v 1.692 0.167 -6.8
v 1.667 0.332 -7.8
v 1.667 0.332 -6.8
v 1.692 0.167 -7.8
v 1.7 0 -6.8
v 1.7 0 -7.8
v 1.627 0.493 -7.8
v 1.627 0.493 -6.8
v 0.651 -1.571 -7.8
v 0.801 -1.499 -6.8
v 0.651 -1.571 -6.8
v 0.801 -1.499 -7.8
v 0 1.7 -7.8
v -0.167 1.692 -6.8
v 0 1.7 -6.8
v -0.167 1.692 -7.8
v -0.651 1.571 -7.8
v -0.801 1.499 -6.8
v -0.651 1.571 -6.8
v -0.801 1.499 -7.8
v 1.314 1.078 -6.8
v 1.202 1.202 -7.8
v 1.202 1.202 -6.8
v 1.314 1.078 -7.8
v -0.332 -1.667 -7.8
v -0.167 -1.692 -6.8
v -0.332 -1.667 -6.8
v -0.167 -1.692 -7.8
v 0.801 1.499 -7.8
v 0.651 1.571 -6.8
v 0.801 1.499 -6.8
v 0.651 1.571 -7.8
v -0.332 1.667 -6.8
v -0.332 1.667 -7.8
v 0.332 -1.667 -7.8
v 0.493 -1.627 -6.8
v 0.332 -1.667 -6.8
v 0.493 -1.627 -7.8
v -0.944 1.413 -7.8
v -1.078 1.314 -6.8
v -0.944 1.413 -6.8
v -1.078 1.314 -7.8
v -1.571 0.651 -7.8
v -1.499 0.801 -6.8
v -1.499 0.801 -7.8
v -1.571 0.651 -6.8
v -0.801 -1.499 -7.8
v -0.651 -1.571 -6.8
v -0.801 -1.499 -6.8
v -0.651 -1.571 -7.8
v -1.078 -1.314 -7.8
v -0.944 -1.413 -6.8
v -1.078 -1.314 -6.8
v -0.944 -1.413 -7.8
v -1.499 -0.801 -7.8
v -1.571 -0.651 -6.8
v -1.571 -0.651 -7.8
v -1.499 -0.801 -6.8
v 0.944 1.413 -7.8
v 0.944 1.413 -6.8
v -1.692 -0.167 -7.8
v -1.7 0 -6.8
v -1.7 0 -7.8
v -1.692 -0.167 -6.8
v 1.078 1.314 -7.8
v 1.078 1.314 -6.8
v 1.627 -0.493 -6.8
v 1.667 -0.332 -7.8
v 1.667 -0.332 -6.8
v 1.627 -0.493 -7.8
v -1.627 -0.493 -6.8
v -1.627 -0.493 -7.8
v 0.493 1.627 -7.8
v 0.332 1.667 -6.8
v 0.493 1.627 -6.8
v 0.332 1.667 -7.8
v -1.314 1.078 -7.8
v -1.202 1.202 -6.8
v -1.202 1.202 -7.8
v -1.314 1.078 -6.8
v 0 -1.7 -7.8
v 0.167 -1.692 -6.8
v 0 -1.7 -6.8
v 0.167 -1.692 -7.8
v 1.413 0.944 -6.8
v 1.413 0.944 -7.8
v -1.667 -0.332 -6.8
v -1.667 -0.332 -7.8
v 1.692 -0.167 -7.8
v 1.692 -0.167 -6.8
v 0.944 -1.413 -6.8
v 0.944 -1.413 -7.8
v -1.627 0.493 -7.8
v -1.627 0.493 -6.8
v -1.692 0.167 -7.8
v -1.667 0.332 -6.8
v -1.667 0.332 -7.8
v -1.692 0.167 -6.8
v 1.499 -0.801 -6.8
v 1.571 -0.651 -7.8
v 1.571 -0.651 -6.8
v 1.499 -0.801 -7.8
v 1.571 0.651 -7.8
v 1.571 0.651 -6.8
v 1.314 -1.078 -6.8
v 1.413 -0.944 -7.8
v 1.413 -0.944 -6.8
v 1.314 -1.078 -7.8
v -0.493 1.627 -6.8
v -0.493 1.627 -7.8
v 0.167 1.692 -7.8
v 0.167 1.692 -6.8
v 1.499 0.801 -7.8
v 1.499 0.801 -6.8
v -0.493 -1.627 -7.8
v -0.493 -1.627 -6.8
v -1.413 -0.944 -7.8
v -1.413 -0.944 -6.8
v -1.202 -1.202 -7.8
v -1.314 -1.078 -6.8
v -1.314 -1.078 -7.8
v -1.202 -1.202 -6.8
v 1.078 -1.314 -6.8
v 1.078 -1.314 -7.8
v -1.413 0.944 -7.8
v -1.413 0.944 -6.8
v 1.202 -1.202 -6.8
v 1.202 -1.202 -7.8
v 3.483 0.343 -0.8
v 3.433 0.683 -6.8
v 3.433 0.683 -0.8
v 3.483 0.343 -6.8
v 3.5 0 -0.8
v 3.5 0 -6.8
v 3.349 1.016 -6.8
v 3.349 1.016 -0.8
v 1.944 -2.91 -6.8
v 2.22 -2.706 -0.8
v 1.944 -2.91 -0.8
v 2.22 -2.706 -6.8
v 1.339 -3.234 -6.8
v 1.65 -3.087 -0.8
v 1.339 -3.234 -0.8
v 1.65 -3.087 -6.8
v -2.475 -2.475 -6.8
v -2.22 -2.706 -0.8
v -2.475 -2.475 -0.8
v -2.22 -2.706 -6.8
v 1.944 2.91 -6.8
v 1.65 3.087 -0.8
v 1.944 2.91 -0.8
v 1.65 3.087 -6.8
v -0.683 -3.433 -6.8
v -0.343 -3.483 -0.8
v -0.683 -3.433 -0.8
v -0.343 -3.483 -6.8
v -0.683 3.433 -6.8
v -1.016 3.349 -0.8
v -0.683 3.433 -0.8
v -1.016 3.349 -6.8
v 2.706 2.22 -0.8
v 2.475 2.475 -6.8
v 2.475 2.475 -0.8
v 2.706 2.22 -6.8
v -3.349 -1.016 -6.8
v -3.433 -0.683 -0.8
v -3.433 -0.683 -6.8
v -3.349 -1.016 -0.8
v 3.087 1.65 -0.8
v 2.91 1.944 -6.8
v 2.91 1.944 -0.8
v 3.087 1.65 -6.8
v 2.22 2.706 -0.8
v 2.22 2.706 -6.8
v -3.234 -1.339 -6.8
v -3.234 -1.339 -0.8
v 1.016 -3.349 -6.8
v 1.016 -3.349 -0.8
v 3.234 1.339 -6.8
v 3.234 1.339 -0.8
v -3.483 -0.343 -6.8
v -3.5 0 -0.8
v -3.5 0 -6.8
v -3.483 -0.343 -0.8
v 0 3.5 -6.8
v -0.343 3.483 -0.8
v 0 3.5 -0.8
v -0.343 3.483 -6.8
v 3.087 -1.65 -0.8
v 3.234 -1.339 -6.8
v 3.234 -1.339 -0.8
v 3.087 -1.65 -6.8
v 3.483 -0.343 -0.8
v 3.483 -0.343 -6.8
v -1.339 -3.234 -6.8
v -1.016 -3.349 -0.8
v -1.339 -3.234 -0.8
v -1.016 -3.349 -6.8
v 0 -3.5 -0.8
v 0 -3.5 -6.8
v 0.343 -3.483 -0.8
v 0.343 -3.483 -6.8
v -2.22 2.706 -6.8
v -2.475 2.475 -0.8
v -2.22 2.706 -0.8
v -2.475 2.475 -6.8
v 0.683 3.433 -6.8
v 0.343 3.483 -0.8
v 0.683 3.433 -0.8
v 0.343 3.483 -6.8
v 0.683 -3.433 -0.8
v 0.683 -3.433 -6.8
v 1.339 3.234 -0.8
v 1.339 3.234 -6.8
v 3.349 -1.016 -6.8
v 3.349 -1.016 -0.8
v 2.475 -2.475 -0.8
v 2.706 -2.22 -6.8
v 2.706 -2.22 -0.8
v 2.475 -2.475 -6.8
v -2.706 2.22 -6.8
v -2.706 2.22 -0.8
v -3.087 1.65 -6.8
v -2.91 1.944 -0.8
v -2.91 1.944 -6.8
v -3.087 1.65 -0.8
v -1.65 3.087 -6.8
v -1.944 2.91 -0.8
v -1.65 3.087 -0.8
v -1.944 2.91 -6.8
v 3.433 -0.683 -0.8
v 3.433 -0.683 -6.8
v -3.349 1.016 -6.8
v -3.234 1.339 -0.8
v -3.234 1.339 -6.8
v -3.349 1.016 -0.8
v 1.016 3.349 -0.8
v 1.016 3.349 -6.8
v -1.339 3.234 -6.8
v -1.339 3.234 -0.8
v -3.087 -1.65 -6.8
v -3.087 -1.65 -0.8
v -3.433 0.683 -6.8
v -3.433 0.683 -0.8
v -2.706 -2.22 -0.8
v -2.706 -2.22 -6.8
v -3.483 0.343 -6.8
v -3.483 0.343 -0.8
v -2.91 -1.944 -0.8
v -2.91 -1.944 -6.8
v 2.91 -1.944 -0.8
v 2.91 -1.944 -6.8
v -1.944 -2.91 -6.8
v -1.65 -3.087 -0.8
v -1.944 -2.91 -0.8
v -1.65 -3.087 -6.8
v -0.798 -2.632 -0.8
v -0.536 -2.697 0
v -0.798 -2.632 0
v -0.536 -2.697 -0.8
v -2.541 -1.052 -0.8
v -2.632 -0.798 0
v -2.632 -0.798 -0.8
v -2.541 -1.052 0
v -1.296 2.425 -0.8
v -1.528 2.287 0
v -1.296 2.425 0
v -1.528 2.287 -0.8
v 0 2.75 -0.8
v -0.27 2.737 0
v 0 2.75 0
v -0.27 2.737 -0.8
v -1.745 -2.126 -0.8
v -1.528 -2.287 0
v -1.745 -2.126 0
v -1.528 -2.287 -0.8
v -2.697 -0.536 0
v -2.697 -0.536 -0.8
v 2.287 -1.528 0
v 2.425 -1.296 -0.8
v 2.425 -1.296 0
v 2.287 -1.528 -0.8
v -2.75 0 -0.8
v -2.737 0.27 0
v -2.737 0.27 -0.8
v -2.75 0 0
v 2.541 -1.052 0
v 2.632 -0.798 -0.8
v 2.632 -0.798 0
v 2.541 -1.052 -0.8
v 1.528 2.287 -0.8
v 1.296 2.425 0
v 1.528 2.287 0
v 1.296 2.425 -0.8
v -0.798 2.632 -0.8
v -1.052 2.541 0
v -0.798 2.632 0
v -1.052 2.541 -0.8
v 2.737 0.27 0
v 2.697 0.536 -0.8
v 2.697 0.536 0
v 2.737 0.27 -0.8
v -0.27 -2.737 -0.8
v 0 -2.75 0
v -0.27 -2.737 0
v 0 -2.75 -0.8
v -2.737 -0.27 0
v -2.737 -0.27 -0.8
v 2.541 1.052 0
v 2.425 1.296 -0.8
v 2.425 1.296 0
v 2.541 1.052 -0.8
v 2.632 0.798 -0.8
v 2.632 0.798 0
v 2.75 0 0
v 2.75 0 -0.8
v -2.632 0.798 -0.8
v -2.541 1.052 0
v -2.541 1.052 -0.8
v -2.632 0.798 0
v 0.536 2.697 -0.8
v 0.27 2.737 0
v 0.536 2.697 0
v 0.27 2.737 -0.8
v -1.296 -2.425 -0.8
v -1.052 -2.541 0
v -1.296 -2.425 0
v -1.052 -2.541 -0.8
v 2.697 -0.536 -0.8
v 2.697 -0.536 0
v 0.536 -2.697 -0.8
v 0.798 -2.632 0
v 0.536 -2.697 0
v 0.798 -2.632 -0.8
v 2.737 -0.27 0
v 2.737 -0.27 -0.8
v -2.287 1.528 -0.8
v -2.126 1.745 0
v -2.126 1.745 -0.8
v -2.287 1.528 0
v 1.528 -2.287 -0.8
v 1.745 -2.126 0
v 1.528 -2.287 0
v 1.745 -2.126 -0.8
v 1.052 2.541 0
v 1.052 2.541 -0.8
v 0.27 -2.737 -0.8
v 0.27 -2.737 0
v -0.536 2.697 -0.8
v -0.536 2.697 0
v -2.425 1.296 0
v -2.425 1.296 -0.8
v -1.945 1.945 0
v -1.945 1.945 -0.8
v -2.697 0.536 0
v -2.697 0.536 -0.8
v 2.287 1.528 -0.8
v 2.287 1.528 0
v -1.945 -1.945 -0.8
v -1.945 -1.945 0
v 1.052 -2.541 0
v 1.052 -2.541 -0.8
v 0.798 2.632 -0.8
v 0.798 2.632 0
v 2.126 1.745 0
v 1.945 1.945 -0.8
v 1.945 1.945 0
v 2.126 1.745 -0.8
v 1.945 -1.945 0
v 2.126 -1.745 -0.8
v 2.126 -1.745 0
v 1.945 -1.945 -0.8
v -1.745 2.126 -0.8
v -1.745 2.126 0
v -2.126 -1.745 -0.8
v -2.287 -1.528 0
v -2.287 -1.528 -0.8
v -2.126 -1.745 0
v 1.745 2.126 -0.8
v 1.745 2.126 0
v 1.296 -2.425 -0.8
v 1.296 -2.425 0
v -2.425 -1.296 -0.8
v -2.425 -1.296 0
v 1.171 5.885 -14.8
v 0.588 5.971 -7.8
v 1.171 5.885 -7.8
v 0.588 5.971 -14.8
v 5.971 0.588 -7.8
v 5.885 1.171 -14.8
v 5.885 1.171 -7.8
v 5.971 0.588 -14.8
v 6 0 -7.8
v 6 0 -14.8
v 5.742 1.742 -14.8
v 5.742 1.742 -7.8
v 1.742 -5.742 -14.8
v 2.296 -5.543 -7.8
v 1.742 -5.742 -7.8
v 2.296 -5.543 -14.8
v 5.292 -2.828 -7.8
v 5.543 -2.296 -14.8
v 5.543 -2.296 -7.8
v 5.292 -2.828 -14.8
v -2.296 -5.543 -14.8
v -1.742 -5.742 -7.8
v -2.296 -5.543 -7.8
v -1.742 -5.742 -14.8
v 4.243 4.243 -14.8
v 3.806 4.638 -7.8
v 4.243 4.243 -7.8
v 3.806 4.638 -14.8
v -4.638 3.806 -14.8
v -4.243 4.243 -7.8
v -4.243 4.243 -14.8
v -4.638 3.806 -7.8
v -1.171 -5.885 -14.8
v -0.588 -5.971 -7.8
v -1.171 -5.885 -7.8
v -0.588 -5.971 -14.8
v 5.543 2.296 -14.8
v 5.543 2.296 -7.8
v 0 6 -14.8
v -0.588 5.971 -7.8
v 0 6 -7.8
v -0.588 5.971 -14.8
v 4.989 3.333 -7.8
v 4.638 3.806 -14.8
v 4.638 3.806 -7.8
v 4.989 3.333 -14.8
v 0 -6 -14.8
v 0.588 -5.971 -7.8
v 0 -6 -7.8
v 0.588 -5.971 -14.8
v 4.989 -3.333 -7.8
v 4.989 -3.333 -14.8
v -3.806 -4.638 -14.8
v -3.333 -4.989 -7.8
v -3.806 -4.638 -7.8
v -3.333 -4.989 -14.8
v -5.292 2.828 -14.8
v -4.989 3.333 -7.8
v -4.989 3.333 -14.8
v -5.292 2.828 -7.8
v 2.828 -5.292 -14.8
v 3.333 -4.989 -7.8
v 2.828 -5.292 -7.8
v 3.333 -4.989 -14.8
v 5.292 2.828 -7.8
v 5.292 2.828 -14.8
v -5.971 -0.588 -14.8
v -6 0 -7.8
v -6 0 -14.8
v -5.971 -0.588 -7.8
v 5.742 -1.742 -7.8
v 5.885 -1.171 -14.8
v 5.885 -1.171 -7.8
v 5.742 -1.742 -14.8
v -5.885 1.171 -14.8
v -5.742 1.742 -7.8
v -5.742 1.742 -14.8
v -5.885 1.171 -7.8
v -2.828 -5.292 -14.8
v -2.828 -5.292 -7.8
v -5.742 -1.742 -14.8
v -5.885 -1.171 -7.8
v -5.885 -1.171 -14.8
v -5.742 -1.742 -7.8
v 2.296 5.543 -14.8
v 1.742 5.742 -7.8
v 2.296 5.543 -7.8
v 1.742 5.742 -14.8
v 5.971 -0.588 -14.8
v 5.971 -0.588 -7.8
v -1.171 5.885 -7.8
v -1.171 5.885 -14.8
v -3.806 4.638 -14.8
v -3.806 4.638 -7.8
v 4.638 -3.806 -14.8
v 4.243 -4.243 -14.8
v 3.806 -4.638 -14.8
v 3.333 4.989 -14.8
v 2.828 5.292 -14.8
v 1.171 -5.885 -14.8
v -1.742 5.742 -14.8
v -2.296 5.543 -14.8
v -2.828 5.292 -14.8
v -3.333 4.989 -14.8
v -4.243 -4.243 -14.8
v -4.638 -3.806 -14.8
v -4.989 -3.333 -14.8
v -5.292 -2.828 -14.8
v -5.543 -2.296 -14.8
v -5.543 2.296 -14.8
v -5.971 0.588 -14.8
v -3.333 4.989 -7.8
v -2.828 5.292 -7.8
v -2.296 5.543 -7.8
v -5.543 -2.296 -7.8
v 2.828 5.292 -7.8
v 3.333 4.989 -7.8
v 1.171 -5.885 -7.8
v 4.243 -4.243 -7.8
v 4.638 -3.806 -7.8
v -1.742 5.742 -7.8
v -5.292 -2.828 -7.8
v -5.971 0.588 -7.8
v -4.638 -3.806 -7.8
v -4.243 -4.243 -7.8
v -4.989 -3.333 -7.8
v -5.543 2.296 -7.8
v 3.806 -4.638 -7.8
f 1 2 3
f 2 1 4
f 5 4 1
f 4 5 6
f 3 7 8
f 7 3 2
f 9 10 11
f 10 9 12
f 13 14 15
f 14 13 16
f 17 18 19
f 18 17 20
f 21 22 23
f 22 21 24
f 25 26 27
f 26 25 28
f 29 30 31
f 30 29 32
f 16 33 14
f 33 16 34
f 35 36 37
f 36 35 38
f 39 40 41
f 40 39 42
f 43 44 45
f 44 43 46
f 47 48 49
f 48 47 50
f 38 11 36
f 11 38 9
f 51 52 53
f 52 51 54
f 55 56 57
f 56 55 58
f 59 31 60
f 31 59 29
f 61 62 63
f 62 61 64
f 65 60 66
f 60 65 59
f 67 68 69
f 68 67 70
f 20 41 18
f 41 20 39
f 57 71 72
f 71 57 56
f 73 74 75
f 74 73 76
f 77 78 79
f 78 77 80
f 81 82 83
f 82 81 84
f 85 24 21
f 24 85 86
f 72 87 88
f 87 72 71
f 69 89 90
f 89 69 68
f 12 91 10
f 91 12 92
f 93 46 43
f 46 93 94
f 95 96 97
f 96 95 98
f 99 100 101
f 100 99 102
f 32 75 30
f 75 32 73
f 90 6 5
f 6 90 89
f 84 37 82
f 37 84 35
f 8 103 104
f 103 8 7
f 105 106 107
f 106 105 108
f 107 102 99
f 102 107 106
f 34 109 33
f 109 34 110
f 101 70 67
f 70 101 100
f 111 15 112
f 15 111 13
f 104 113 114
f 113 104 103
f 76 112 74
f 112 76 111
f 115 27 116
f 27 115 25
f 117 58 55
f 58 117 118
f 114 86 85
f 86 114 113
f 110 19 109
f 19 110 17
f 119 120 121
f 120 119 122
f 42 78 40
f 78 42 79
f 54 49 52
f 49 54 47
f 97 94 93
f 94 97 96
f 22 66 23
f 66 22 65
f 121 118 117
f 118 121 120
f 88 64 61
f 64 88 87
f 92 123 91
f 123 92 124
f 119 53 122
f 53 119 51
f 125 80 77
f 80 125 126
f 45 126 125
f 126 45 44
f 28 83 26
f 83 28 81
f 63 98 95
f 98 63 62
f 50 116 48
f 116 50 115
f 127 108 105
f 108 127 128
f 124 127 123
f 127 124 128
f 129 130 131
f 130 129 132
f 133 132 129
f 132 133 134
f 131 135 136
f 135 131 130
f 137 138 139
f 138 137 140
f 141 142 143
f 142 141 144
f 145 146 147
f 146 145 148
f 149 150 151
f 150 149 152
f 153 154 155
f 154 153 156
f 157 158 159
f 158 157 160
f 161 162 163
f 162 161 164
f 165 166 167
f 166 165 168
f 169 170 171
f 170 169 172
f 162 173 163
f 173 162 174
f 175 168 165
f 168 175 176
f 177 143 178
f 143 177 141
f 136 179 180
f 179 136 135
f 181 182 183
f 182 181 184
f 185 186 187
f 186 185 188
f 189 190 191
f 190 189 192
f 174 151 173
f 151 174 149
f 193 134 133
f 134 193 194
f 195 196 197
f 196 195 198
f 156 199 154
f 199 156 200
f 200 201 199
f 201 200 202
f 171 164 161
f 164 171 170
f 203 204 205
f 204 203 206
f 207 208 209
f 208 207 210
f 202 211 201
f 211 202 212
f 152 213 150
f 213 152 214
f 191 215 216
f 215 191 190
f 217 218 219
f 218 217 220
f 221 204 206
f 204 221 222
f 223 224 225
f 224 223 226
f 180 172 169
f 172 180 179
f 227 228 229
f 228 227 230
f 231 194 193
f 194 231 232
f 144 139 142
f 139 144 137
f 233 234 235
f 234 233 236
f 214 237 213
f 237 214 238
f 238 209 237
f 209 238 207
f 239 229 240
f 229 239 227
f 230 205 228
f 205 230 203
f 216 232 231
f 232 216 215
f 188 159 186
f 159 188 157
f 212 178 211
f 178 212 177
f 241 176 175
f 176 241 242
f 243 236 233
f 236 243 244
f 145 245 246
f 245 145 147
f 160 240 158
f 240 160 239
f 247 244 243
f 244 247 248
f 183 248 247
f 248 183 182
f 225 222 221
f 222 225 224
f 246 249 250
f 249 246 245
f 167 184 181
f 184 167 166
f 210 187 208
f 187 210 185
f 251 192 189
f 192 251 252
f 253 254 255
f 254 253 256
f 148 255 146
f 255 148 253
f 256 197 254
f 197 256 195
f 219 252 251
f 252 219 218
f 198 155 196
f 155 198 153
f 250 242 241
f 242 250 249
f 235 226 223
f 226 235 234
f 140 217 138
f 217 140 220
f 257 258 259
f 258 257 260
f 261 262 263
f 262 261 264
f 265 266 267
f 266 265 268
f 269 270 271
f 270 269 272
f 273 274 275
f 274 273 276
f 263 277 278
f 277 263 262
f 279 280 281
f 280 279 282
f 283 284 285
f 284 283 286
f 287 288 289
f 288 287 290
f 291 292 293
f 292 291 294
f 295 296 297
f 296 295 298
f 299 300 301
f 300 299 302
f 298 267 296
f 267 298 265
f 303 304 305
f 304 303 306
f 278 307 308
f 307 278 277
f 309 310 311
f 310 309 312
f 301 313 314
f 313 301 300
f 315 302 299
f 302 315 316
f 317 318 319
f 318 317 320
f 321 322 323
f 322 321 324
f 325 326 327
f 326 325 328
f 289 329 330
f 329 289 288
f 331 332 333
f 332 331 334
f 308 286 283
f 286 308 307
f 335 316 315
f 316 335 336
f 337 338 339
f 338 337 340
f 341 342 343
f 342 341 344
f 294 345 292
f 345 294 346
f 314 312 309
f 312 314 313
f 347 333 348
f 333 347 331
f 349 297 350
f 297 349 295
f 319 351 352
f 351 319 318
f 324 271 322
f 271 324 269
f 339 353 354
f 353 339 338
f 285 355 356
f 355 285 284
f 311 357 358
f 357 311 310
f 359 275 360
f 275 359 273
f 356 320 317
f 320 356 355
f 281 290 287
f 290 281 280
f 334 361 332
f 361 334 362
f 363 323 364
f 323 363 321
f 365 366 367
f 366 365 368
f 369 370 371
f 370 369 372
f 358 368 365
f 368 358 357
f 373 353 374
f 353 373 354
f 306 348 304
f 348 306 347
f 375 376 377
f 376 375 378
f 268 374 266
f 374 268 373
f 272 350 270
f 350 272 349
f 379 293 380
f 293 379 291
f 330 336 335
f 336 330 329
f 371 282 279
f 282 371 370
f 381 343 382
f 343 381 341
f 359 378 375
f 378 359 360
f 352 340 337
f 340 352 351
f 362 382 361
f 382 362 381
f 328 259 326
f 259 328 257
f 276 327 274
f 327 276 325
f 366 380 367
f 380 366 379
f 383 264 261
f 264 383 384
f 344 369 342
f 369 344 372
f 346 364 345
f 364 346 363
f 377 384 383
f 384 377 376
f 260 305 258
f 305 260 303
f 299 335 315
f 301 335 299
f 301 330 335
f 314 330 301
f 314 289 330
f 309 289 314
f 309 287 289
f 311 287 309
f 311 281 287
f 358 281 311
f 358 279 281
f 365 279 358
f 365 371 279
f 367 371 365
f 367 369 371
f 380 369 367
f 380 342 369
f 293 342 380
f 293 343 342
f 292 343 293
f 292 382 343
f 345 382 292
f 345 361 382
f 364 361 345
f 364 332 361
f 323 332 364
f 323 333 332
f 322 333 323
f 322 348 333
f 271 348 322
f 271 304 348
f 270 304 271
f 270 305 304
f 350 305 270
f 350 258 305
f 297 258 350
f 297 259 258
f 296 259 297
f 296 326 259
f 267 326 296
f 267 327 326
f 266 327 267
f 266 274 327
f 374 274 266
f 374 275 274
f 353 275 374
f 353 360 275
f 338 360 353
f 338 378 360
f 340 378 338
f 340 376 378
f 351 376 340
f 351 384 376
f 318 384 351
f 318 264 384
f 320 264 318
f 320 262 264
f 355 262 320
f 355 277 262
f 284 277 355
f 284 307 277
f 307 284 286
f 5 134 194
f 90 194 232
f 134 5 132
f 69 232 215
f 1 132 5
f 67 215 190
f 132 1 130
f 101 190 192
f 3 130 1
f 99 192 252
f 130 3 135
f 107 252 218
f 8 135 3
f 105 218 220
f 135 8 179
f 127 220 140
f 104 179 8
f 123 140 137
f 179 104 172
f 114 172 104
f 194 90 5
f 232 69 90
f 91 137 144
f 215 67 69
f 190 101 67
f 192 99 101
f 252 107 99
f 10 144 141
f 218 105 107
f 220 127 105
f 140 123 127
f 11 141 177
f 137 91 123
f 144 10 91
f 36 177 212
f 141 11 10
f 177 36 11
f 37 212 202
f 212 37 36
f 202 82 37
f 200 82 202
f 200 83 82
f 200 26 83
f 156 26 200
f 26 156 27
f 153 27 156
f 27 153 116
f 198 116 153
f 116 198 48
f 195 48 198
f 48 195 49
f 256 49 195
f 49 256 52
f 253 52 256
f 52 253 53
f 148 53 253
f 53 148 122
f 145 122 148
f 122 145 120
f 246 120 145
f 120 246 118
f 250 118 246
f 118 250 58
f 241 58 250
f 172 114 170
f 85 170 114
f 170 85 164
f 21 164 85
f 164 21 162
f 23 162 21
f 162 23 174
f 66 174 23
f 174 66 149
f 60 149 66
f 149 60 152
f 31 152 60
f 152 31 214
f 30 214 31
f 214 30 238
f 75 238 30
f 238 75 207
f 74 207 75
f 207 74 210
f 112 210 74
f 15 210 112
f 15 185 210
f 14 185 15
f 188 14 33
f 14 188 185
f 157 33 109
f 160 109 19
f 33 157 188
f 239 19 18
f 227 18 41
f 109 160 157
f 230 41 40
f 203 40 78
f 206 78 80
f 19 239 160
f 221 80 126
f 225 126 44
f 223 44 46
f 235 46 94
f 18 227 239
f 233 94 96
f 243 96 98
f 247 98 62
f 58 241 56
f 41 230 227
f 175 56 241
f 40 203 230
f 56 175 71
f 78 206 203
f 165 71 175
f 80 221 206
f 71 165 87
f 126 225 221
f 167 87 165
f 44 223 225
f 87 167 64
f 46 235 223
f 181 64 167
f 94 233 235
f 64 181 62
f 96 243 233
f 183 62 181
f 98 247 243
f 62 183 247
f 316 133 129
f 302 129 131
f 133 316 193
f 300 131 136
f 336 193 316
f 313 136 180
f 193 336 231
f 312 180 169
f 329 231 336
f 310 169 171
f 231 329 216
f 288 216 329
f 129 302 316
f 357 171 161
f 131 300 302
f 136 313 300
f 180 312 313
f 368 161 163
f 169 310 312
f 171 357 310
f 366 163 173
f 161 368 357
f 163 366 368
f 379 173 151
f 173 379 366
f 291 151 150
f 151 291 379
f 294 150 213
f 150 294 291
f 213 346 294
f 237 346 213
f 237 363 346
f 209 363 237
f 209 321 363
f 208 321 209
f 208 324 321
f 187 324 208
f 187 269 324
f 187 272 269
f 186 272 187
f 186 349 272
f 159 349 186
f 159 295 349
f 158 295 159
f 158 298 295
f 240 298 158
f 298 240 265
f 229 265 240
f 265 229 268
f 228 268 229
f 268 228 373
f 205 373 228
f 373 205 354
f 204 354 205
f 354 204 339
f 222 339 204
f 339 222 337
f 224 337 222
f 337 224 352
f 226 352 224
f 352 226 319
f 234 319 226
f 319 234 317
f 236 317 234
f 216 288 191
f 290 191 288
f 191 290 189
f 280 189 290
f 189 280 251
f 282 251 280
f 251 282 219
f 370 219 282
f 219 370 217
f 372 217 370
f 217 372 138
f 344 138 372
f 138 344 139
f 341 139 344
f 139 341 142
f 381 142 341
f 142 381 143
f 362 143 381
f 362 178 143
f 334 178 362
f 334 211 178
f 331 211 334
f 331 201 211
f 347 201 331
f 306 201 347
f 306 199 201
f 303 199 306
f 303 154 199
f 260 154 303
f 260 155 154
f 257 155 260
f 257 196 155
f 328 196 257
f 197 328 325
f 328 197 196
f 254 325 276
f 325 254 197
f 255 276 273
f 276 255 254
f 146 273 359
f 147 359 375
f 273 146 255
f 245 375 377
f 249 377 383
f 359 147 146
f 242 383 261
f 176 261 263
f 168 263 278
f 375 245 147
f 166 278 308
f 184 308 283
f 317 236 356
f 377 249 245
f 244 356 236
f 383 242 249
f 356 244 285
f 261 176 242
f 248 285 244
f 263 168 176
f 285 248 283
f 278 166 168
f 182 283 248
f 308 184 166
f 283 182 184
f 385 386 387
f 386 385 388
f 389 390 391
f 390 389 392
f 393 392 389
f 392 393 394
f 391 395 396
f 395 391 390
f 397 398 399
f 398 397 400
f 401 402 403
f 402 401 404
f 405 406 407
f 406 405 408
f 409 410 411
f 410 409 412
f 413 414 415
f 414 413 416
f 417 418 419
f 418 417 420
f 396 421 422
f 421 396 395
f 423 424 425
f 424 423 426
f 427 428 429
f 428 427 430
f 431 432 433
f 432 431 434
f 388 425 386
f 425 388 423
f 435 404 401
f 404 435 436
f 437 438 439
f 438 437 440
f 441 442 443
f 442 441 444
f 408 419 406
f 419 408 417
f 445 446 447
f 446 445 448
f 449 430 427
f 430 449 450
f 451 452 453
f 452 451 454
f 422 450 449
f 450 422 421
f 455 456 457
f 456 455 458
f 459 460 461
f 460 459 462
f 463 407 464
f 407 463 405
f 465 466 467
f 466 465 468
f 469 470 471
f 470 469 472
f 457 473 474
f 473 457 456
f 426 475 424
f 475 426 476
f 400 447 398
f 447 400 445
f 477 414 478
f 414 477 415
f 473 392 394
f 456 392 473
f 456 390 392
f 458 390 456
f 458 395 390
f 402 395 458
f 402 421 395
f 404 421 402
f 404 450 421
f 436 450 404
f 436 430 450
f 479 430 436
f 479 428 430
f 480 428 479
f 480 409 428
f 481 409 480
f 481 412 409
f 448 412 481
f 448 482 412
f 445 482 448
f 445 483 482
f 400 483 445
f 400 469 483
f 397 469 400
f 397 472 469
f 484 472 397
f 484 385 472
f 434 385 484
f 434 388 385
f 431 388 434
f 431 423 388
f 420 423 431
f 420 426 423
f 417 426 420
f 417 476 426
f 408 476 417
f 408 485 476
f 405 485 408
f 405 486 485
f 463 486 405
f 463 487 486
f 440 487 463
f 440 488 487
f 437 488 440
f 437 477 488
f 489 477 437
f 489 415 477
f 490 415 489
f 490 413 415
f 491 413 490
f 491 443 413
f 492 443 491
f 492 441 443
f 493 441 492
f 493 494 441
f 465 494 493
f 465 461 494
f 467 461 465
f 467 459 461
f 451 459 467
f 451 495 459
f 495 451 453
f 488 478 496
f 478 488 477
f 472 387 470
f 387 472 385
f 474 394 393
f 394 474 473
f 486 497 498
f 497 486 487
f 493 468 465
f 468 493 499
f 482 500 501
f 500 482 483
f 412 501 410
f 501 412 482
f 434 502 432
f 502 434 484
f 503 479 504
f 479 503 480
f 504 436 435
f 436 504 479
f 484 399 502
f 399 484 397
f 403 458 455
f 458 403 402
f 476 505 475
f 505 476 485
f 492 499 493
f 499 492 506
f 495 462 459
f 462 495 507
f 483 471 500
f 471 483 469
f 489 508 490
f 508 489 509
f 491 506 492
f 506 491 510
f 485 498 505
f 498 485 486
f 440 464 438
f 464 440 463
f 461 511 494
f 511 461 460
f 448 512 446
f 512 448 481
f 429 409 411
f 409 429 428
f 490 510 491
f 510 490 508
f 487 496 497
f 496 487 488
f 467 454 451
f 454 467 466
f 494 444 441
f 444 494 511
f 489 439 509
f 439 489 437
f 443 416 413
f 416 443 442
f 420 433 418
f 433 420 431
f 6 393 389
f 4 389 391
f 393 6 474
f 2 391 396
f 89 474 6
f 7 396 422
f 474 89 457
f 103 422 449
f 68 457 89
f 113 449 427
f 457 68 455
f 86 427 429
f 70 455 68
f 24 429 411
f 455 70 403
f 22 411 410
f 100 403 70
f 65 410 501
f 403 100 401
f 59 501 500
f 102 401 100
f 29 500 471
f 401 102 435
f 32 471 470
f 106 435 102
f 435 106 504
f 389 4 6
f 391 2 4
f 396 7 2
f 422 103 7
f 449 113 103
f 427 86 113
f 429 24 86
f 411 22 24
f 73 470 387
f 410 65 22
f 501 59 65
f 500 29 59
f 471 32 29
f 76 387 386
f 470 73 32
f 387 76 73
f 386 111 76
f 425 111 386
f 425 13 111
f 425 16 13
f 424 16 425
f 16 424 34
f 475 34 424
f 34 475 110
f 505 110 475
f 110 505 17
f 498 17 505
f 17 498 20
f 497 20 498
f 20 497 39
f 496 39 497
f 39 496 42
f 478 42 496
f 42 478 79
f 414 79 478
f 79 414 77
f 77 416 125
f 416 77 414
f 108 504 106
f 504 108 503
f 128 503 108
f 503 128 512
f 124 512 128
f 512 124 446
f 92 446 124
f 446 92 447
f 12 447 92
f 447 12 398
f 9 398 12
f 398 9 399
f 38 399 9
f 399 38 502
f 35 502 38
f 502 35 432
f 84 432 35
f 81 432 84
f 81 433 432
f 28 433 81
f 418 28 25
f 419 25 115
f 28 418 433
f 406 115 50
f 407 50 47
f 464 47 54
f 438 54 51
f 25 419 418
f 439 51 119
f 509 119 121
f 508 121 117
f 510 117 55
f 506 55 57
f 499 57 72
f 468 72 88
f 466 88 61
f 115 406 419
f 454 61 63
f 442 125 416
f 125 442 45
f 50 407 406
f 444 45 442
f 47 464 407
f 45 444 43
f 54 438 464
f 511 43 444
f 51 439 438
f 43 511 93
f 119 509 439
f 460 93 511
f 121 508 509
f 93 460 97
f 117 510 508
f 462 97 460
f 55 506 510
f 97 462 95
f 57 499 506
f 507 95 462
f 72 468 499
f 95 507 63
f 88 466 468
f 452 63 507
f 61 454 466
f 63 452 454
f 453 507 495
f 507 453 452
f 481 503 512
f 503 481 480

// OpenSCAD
// Parameters
shaft_diameter_mm = 3; //[1.5:6:0.1]
length_mm = 10; //[5:20:0.5]
head_diameter_mm = 5.5; //[2.75:11:0.1]
head_height_mm = 2; //[1:4:0.1]
thread_depth_mm = 0.2; //[0.1:0.5:0.05]
thread_pitch_mm = 0.5; //[0.3:1:0.05]
threaded_fraction = 1; //[0.5:1:0.05]
washer_outer_diameter_mm = 7; //[4:14:0.1]
washer_thickness_mm = 0.8; //[0.4:2:0.05]
washer_hole_clearance_mm = 0.3; //[0.1:0.8:0.05]
spacer_height_mm = 6; //[3:12:0.5]
spacer_wall_mm = 1.8; //[0.9:3.6:0.1]
spacer_hole_clearance_mm = 0.4; //[0.2:1:0.05]
buzzer_diameter_mm = 12; //[6:24:0.5]
buzzer_height_mm = 7; //[3.5:14:0.5]
buzzer_post_diameter_mm = 2; //[1:4:0.1]
buzzer_post_height_mm = 3; //[1.5:6:0.5]
overlap_mm = 1; //[0.5:2:0.1]

// --- Z reference (all parts stacked downward from head top) ---
// Place head with its TOP at z=0 (not centered), then stack parts below with overlap.
z_head_top = 0;
z_head_bottom = z_head_top - head_height_mm;

z_washer_top = z_head_bottom + overlap_mm;
z_washer_bottom = z_washer_top - washer_thickness_mm;

z_spacer_top = z_washer_bottom + overlap_mm;
z_spacer_bottom = z_spacer_top - spacer_height_mm;

z_post_top = z_spacer_bottom + overlap_mm;
z_post_bottom = z_post_top - buzzer_post_height_mm;

z_buzzer_top = z_post_bottom + overlap_mm;
z_buzzer_bottom = z_buzzer_top - buzzer_height_mm;

// Shaft runs from just under head down to length, overlapping into head.
z_shaft_top = z_head_bottom + overlap_mm;
z_shaft_bottom = z_shaft_top - length_mm;

// Screw and Washer
module screw_and_washer() {
  color("DimGray") {
    // Pan Head (top at z=0)
    translate([0, 0, z_head_top - head_height_mm/2])
      cylinder(r=head_diameter_mm/2, h=head_height_mm, center=true, $fn=64);

    // Threaded Shaft (overlaps into head by overlap_mm)
    union() {
      translate([0, 0, (z_shaft_top + z_shaft_bottom)/2])
        cylinder(r=shaft_diameter_mm/2, h=length_mm, center=true, $fn=64);

      translate([0, 0, (z_shaft_top + z_shaft_bottom)/2])
        cylinder(r=shaft_diameter_mm/2 + thread_depth_mm, h=length_mm*threaded_fraction, center=true, $fn=64);
    }

    // Washer (touches head underside with overlap)
    difference() {
      translate([0, 0, (z_washer_top + z_washer_bottom)/2])
        cylinder(r=washer_outer_diameter_mm/2, h=washer_thickness_mm, center=true, $fn=64);

      translate([0, 0, (z_washer_top + z_washer_bottom)/2])
        cylinder(r=(shaft_diameter_mm + washer_hole_clearance_mm)/2,
                 h=washer_thickness_mm + 2*overlap_mm, center=true, $fn=64);
    }
  }
}

// PCB Spacer
module pcb_spacer() {
  color("Silver") {
    difference() {
      translate([0, 0, (z_spacer_top + z_spacer_bottom)/2])
        cylinder(r=(shaft_diameter_mm + spacer_hole_clearance_mm)/2 + spacer_wall_mm,
                 h=spacer_height_mm, center=true, $fn=64);

      translate([0, 0, (z_spacer_top + z_spacer_bottom)/2])
        cylinder(r=(shaft_diameter_mm + spacer_hole_clearance_mm)/2,
                 h=spacer_height_mm + 2*overlap_mm, center=true, $fn=64);
    }
  }
}

// Buzzer
module buzzer() {
  color("Black") {
    // Buzzer Post (overlaps into spacer)
    translate([0, 0, (z_post_top + z_post_bottom)/2])
      cylinder(r=buzzer_post_diameter_mm/2, h=buzzer_post_height_mm, center=true, $fn=64);

    // Buzzer Body (large black cylinder/base) overlaps into post
    translate([0, 0, (z_buzzer_top + z_buzzer_bottom)/2])
      cylinder(r=buzzer_diameter_mm/2, h=buzzer_height_mm, center=true, $fn=64);
  }
}

// Assembly (single connected solid)
module assembly() {
  union() {
    screw_and_washer();
    pcb_spacer();
    buzzer();
  }
}

assembly();
